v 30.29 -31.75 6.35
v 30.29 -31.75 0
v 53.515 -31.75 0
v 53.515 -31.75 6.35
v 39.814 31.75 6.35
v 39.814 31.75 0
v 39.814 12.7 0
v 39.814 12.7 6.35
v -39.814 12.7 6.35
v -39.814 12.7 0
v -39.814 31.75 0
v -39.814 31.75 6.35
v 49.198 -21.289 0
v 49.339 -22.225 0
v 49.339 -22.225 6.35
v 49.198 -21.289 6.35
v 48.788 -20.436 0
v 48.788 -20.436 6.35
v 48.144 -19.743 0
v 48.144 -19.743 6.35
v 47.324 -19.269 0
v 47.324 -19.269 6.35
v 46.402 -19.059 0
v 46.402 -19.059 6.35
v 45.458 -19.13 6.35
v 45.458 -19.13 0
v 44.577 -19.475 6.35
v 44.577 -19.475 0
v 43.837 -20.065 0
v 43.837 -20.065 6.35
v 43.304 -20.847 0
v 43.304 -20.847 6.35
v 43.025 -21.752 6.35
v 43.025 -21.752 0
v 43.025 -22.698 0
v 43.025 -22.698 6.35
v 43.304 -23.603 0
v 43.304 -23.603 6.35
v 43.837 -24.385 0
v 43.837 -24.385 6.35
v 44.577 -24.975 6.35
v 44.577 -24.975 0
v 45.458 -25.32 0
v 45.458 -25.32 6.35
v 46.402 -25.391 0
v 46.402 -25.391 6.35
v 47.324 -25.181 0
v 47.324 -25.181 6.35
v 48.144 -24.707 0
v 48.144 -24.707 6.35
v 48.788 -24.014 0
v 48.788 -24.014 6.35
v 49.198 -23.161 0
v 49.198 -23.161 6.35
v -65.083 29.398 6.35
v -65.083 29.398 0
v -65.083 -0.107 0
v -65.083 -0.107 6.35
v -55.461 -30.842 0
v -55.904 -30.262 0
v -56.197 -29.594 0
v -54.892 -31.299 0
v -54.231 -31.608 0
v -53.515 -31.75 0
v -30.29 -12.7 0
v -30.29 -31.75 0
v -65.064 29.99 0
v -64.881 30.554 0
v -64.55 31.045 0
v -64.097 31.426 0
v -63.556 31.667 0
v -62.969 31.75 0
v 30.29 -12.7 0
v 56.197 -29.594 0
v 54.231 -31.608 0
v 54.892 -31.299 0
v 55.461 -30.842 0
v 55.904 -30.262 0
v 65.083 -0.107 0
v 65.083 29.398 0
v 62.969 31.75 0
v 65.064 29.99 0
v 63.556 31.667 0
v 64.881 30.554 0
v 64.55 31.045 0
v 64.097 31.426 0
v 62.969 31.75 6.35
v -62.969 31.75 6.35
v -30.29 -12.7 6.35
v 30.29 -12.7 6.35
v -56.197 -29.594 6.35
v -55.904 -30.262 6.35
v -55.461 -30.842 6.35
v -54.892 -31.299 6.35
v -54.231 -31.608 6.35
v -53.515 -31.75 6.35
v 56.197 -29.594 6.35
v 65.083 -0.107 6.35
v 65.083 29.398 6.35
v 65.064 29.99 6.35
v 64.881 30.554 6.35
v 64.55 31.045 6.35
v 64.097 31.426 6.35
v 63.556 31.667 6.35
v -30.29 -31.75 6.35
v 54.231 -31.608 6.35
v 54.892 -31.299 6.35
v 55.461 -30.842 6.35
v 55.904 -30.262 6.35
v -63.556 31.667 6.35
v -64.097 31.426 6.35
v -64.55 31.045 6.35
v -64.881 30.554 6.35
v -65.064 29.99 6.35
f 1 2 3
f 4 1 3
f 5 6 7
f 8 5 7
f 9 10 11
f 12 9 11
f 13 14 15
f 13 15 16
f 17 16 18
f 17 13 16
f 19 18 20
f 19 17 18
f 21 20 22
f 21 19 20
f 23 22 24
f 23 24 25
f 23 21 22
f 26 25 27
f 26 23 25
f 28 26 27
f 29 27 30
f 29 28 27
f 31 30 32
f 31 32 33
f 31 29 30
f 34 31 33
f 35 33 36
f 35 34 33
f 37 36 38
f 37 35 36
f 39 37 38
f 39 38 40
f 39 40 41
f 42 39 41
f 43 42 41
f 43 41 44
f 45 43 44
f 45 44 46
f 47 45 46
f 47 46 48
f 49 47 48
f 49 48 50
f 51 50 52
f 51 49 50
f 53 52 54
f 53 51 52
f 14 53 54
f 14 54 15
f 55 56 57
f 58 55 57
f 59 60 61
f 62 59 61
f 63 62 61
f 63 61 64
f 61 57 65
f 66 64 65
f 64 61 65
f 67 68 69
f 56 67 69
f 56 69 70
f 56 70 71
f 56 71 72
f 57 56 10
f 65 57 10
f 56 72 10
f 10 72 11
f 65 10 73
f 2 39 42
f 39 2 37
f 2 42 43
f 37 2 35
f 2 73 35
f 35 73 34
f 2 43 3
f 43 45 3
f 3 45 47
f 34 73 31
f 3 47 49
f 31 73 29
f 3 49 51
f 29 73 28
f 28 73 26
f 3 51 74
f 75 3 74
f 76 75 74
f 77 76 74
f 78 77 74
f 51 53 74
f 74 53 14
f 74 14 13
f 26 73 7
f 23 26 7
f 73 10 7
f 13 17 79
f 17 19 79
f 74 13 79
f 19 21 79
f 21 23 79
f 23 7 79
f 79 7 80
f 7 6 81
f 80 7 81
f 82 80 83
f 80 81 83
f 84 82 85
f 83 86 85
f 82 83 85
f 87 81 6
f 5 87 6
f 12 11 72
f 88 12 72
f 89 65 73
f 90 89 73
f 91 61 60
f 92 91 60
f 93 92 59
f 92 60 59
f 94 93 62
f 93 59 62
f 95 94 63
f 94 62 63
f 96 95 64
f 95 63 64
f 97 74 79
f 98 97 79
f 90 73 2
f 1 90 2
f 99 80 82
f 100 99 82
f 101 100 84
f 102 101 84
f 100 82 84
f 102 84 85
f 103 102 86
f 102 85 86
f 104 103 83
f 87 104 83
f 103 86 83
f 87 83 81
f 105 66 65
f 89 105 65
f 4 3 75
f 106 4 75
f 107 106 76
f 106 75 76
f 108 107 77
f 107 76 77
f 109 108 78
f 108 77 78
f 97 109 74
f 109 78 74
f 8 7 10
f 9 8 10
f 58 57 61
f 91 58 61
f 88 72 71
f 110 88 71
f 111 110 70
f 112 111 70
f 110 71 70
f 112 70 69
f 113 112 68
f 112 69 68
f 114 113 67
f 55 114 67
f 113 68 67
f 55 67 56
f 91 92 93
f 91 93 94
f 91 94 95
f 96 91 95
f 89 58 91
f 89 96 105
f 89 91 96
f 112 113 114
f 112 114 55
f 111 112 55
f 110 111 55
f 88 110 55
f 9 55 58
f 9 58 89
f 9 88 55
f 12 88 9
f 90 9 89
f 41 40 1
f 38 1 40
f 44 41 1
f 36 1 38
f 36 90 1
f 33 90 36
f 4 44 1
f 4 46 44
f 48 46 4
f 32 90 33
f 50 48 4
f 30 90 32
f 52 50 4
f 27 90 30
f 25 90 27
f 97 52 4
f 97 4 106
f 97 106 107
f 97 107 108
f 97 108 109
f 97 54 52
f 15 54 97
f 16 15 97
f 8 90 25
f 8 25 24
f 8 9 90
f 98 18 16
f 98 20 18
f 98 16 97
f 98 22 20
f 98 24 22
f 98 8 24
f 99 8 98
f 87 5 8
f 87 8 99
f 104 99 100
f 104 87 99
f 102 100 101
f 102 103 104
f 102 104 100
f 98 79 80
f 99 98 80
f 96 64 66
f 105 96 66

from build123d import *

# Parameters (mm, degrees)
F0_R     = 3.175
F1_DEPTH = 6.35


with BuildPart() as f1:
    # F0 (on Top) → F1 (new body)
    with BuildSketch(Plane.XY):
        with BuildLine():
            Line((39.8145, 12.7), (0, 12.7))
            Line((0, 12.7), (-39.8145, 12.7))
            Line((-39.8145, 12.7), (-39.8145, 31.75))
            Line((-39.8145, 31.75), (-62.96914, 31.75))
            ThreePointArc((-62.96914, 31.75), (-64.550414, 31.045236), (-65.083471, 29.398126))
            Line((-65.083471, 29.398126), (-65.083471, -0.106514))
            Line((-65.083471, -0.106514), (-56.196699, -29.59399))
            ThreePointArc((-56.196699, -29.59399), (-55.189961, -31.08737), (-53.51526, -31.75))
            Line((-53.51526, -31.75), (-30.2895, -31.75))
            Line((-30.2895, -31.75), (-30.2895, -12.7))
            Line((-30.2895, -12.7), (0, -12.7))
            Line((0, -12.7), (30.2895, -12.7))
            Line((30.2895, -12.7), (30.2895, -31.75))
            Line((30.2895, -31.75), (53.51526, -31.75))
            ThreePointArc((53.51526, -31.75), (55.189961, -31.08737), (56.196699, -29.59399))
            Line((56.196699, -29.59399), (65.083471, -0.106514))
            Line((65.083471, -0.106514), (65.083471, 29.398126))
            ThreePointArc((65.083471, 29.398126), (64.550414, 31.045236), (62.96914, 31.75))
            Line((62.96914, 31.75), (39.8145, 31.75))
            Line((39.8145, 31.75), (39.8145, 12.7))
        make_face()
        with Locations((46.1645, -22.225)):
            Circle(F0_R, mode=Mode.SUBTRACT)
    extrude(amount=F1_DEPTH)


solid = f1.part
